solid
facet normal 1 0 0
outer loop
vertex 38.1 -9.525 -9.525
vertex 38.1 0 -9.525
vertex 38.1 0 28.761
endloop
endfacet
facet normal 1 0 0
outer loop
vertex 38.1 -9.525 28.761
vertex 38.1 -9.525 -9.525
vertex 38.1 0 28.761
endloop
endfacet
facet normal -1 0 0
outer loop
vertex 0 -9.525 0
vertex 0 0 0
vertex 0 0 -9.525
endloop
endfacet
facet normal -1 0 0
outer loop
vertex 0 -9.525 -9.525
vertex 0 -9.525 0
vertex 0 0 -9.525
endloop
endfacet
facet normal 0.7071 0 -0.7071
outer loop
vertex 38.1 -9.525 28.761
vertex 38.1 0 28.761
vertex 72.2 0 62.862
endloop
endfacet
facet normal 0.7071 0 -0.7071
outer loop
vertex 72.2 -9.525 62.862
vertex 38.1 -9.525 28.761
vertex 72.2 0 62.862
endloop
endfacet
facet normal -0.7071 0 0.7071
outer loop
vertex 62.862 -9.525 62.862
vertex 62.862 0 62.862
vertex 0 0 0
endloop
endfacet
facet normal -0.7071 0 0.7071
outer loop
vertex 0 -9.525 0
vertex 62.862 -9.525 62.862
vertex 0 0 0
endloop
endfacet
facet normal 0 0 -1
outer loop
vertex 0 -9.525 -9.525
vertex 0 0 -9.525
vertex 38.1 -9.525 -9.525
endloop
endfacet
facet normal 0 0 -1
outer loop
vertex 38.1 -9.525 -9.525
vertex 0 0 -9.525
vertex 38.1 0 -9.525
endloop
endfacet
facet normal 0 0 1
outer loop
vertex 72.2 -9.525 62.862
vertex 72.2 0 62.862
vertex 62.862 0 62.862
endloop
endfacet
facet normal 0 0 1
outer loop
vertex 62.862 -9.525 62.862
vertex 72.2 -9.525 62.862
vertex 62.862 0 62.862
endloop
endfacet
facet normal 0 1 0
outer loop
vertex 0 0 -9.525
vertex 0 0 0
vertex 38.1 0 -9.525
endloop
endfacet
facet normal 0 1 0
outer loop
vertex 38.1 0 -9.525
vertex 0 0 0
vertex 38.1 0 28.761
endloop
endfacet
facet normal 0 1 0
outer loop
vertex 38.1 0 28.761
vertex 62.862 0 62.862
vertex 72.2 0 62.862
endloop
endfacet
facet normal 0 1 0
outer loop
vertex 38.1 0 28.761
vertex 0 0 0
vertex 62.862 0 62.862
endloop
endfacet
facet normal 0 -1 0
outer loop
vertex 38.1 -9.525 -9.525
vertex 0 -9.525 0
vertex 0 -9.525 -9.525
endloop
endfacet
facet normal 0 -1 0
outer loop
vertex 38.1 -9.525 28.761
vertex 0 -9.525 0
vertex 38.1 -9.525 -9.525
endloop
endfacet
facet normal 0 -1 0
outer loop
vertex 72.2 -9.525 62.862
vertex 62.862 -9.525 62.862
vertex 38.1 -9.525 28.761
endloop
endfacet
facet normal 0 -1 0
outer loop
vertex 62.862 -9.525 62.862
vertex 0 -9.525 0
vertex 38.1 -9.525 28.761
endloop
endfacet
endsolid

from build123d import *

# Parameters (mm, degrees)
F1_DEPTH = 9.525


with BuildPart() as f1:
    # F0 (on Front) → F1 (new body)
    with BuildSketch(Plane.XZ):
        Polygon((62.861793, 62.861793), (0, 0), (9.338706, 0), (38.1, 28.761294), (72.200499, 62.861793), align=None)
        Polygon((9.338706, 0), (0, 0), (0, -9.525), (38.1, -9.525), (38.1, 0), align=None)
        Polygon((38.1, 28.761294), (9.338706, 0), (38.1, 0), align=None)
    extrude(amount=F1_DEPTH)


solid = f1.part
